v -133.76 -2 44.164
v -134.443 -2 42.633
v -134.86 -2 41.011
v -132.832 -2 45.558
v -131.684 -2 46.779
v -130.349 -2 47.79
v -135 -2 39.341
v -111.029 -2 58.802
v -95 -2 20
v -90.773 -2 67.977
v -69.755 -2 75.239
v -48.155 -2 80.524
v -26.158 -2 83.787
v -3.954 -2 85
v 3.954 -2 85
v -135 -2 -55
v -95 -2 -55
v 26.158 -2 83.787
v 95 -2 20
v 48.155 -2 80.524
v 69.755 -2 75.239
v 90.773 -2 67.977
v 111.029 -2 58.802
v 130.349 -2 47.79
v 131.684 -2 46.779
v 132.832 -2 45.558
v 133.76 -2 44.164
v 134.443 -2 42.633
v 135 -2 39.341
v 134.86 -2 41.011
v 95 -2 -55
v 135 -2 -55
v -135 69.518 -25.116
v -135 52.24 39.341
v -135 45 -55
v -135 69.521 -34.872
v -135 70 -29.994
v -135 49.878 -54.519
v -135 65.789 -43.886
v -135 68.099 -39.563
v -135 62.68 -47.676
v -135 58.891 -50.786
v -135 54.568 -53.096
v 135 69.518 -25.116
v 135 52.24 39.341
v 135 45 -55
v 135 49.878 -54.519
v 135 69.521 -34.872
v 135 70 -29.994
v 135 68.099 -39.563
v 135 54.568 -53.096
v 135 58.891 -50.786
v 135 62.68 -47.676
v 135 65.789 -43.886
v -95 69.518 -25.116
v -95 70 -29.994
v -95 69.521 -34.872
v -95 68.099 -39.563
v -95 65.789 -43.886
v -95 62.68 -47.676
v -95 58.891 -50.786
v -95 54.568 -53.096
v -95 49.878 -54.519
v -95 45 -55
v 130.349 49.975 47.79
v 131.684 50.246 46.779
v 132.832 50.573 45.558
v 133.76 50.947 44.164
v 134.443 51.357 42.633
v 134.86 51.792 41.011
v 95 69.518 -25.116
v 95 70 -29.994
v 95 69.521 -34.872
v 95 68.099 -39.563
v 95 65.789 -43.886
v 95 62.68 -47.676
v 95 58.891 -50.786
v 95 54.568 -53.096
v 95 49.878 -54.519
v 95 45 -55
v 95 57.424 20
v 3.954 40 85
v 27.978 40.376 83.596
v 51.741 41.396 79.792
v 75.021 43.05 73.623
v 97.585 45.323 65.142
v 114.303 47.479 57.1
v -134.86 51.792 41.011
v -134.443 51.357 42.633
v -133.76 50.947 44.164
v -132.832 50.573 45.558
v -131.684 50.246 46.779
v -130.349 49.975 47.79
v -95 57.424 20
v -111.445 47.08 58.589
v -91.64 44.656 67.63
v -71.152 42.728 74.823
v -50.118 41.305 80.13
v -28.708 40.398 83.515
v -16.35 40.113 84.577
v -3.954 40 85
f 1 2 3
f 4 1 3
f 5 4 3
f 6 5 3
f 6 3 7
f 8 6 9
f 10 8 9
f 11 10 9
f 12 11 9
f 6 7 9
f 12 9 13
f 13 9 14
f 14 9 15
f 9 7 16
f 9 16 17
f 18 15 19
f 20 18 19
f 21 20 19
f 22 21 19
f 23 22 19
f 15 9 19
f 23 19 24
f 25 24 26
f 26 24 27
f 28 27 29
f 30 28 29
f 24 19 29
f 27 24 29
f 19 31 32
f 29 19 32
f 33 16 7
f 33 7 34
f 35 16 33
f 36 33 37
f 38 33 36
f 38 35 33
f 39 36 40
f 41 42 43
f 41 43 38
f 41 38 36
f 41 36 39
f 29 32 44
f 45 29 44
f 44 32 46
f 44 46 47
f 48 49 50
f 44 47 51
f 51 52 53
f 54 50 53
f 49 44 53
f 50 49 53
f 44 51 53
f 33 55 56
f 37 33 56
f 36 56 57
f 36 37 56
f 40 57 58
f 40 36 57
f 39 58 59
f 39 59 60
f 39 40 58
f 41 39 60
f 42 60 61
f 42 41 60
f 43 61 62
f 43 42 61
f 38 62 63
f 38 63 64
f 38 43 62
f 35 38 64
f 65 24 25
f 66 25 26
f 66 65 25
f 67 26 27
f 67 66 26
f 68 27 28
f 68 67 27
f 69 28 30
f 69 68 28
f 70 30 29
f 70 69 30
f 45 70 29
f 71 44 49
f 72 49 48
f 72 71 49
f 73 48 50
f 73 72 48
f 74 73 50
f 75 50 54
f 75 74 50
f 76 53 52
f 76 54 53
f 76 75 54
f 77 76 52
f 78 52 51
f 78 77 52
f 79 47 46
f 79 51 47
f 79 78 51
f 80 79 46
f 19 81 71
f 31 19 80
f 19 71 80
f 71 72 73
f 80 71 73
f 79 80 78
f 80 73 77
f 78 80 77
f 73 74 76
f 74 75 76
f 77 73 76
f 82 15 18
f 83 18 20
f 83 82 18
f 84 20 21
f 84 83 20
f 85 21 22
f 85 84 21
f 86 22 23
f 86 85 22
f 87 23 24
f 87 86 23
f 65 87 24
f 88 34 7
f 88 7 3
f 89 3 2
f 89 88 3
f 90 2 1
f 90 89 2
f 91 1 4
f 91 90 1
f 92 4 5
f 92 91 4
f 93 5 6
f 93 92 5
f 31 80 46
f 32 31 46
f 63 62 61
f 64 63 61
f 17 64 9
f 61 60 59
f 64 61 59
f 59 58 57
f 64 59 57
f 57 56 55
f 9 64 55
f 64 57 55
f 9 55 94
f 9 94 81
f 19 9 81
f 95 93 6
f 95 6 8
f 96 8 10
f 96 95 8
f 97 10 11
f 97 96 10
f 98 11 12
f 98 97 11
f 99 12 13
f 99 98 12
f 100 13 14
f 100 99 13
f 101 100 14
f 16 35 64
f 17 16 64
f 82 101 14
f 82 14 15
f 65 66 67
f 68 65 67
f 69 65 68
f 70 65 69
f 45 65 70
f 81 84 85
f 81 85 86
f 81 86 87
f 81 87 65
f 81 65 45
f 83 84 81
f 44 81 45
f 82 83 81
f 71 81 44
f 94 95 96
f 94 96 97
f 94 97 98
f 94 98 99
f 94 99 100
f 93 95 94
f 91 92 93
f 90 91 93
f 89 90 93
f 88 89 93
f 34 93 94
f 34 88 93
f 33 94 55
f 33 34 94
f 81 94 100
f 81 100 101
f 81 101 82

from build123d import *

# Parameters (mm, degrees)
BOSS_EXTRUDE1_DEPTH      = 70
BOSS_EXTRUDE1_DEPTH_BACK = 2
SKETCH1_W                = 270
SKETCH1_H                = 110
CUT_EXTRUDE3_DEPTH       = 331
SKETCH18_W               = 270
SKETCH18_H               = 72
BOSS_EXTRUDE3_DEPTH      = 30
CUT_EXTRUDE16_DEPTH      = 292.590466236
CUT_EXTRUDE16_DEPTH_BACK = 292.590466236
CUT_EXTRUDE17_DEPTH      = 176.025712397
CUT_EXTRUDE17_DEPTH_BACK = 176.025712397


with BuildPart() as part:
    # Sketch1 → Boss-Extrude1 (new, two sides: drawn at the far end of the back side and taken through both)
    with BuildSketch(Plane(origin=(0, 0, 0), x_dir=(1, 0, 0), z_dir=(0, 1, 0)).offset(-BOSS_EXTRUDE1_DEPTH_BACK)):
        Rectangle(SKETCH1_W, SKETCH1_H)
    extrude(amount=BOSS_EXTRUDE1_DEPTH + BOSS_EXTRUDE1_DEPTH_BACK)

    # Sketch2 → Cut-Extrude3 (cut)
    with BuildSketch(Plane(origin=(0, 70, 0), x_dir=(1, 0, 0), z_dir=(0, 1, 0))):
        Polygon((-95, 55), (-95, -20), (0, -20), (95, -20), (95, 55), align=None)
    extrude(amount=-CUT_EXTRUDE3_DEPTH, mode=Mode.SUBTRACT)

    # Sketch18 → Boss-Extrude3 (add)
    with BuildSketch(Plane.XY.offset(55)):
        with Locations((0, 34)):
            Rectangle(SKETCH18_W, SKETCH18_H)
    extrude(amount=BOSS_EXTRUDE3_DEPTH)

    # Sketch19 → Cut-Extrude16 (cut, two sides: drawn at the far end of the back side and taken through both)
    with BuildSketch(Plane(origin=(135, 0, 0), x_dir=(0, 0, -1), z_dir=(1, 0, 0)).offset(-CUT_EXTRUDE16_DEPTH_BACK)):
        with BuildLine():
            Line((-379.944046873, -39.064261373), (-85, 40))
            Line((-85, 40), (25.116182189, 69.51832628))
            ThreePointArc((25.116182189, 69.51832628), (45.85724684, 64.327382716), (55, 45))
            Line((55, 45), (55, -260.357410606))
            Line((55, -260.357410606), (331.938852434, 283.956345293))
            Line((331.938852434, 283.956345293), (-103.005194439, 505.249494526))
            Line((-103.005194439, 505.249494526), (-379.944046873, -39.064261373))
        make_face()
    extrude(amount=CUT_EXTRUDE16_DEPTH + CUT_EXTRUDE16_DEPTH_BACK, mode=Mode.SUBTRACT)

    # Sketch21 → Cut-Extrude17 (cut, two sides: drawn at the far end of the back side and taken through both)
    with BuildSketch(Plane.XZ.offset(2).offset(-CUT_EXTRUDE17_DEPTH_BACK)):
        with BuildLine():
            ThreePointArc((3.953760881, 85), (69.754776005, 75.238802072), (130.348831285, 47.79039518))
            ThreePointArc((130.348831285, 47.79039518), (133.760374217, 44.16356592), (135, 39.341134628))
            Line((135, 39.341134628), (135, 85))
            Line((135, 85), (3.953760881, 85))
        make_face()
        with BuildLine():
            ThreePointArc((-130.348831285, 47.79039518), (-69.754776005, 75.238802072), (-3.953760881, 85))
            Line((-3.953760881, 85), (-135, 85))
            Line((-135, 85), (-135, 39.341134628))
            ThreePointArc((-135, 39.341134628), (-133.760374217, 44.16356592), (-130.348831285, 47.79039518))
        make_face()
    extrude(amount=CUT_EXTRUDE17_DEPTH + CUT_EXTRUDE17_DEPTH_BACK, mode=Mode.SUBTRACT)


solid = part.part
